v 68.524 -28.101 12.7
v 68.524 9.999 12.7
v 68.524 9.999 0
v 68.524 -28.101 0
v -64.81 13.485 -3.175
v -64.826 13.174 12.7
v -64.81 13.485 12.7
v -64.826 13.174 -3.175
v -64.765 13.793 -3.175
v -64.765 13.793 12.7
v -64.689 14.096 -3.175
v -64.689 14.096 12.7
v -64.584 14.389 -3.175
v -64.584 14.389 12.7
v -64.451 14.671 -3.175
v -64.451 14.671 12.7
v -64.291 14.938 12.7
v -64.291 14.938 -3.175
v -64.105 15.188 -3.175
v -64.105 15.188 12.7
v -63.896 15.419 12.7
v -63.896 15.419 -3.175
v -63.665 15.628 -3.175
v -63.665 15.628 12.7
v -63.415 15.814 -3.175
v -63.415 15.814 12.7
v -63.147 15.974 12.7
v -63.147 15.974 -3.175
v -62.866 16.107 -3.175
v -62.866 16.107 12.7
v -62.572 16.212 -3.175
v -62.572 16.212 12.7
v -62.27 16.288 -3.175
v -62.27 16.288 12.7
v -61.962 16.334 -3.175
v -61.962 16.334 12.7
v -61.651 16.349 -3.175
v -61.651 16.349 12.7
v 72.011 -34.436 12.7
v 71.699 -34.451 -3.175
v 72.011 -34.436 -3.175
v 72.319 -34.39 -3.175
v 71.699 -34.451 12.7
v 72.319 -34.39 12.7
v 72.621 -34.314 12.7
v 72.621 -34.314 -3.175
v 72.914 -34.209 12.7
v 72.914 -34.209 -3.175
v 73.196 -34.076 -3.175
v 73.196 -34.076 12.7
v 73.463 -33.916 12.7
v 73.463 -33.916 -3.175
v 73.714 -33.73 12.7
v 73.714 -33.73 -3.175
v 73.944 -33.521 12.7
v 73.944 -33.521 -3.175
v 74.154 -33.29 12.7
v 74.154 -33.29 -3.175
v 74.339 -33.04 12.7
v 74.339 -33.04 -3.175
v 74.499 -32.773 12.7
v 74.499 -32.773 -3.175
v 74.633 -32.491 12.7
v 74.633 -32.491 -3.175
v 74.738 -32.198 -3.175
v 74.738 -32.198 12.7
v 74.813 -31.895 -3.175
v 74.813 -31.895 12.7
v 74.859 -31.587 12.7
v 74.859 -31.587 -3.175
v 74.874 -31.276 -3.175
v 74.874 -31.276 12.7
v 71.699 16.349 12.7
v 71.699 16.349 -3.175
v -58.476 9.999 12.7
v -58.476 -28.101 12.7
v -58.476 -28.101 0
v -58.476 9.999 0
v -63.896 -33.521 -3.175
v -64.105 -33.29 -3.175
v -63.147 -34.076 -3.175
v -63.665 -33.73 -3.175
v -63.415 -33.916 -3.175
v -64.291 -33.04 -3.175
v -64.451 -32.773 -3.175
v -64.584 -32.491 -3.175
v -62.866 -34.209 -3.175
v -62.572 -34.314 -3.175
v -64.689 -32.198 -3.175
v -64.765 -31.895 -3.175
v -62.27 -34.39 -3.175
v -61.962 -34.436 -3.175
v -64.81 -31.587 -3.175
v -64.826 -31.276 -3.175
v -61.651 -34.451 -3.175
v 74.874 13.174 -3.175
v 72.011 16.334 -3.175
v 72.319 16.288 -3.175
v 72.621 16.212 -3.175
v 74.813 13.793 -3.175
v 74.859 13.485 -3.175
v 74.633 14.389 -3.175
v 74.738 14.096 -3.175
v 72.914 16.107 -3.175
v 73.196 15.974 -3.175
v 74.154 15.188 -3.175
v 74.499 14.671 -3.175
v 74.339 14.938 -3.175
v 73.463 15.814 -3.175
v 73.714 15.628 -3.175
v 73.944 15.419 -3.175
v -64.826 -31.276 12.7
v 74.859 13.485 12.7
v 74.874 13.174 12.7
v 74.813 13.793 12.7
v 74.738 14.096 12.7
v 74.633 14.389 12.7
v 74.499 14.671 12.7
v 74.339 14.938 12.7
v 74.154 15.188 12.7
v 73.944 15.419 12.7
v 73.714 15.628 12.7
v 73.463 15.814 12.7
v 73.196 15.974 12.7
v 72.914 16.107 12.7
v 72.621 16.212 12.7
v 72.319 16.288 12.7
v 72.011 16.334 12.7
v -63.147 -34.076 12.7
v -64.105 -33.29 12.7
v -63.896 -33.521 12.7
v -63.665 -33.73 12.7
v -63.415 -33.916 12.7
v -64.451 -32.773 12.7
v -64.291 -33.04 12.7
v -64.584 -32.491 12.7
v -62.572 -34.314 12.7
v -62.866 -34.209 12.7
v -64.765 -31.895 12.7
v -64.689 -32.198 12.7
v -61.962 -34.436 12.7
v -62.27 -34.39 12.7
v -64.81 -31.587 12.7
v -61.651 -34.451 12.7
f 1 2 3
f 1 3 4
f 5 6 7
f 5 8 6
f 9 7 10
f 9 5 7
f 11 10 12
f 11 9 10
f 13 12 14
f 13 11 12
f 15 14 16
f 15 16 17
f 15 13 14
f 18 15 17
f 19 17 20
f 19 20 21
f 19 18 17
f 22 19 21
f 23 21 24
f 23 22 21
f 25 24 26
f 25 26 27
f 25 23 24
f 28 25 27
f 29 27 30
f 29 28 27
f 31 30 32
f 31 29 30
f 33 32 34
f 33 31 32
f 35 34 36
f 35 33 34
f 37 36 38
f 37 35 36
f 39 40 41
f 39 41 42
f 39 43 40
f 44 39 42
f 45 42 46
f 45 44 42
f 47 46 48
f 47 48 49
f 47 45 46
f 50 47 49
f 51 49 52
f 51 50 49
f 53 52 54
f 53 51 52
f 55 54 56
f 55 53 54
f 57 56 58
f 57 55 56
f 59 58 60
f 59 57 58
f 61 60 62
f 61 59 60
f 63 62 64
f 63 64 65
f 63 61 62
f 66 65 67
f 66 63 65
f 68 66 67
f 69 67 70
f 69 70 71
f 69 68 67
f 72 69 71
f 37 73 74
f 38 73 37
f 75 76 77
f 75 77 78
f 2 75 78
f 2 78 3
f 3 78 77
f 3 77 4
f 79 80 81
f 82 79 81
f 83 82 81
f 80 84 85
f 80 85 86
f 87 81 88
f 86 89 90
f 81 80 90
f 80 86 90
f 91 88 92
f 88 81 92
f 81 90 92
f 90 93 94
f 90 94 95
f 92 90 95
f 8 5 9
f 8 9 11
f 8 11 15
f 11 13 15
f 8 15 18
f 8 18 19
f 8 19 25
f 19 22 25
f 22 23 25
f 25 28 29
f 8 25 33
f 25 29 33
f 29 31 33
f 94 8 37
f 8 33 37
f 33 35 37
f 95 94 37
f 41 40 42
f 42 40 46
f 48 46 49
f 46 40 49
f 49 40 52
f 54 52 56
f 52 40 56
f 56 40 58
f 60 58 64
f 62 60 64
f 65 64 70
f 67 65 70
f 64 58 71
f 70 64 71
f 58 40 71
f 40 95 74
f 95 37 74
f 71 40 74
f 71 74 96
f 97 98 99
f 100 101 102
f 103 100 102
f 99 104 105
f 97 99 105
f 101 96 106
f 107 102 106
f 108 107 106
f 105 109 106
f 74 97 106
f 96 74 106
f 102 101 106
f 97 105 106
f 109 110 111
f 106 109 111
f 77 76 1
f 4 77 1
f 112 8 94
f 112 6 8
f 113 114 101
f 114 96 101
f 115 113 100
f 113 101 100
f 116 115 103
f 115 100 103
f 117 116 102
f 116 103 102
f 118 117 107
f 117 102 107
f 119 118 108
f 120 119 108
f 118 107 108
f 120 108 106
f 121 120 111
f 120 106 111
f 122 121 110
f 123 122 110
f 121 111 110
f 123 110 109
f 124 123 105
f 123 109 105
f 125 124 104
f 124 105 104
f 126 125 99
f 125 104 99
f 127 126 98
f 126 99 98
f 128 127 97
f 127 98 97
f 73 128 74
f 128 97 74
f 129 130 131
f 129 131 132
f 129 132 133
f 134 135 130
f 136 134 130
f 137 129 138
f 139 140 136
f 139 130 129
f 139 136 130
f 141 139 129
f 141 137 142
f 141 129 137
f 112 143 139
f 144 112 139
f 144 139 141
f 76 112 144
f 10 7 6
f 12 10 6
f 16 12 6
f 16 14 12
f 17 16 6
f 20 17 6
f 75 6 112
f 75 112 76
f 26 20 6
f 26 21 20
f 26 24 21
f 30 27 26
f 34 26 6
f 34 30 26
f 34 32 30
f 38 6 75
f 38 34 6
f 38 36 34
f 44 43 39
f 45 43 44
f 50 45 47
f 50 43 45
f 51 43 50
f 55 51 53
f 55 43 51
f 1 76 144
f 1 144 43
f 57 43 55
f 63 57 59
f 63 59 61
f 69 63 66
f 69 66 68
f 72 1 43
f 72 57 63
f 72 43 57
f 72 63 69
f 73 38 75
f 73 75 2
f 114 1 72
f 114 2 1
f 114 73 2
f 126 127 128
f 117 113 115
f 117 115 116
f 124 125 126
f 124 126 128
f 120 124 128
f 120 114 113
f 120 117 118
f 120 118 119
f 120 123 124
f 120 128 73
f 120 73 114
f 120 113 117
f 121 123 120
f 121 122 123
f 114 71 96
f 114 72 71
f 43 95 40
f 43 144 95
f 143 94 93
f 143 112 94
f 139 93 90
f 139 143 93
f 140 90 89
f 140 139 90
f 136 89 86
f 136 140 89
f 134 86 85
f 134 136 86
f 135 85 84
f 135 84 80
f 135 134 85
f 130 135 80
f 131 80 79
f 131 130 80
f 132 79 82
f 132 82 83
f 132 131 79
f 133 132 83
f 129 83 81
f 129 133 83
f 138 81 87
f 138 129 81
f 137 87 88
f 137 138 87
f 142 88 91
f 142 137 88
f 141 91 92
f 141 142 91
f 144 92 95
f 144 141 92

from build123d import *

# Parameters (mm, degrees)
F0_W     = 6.35
F0_H     = 6.35
F0_H_2   = 38.1
F0_W_2   = 127
F1_DEPTH = 12.7
F2_DEPTH = 3.175
F3_DEPTH = 3.175
F4_R     = 3.175


with BuildPart() as f1:
    # F0 (on Top) → F1 (new body)
    with BuildSketch(Plane.XY):
        with Locations((71.6993232399, -31.2760059339)):
            Rectangle(F0_W, F0_H)
        with Locations((-61.6506767601, -9.0510059339)):
            Rectangle(F0_W, F0_H_2)
        with Locations((-61.6506767601, 13.1739940661)):
            Rectangle(F0_W, F0_H)
        with Locations((5.0243232399, 13.1739940661)):
            Rectangle(F0_W_2, F0_H)
        with Locations((71.6993232399, -9.0510059339)):
            Rectangle(F0_W, F0_H_2)
        with Locations((71.6993232399, 13.1739940661)):
            Rectangle(F0_W, F0_H)
        with Locations((5.0243232399, -31.2760059339)):
            Rectangle(F0_W_2, F0_H)
        with Locations((-61.6506767601, -31.2760059339)):
            Rectangle(F0_W, F0_H)
    extrude(amount=F1_DEPTH)

    # F2 (add): a face of the model
    f2_faces = [f1.faces().sort_by_distance(p)[0] for p in [
        (-63.3391798714, -9.0510059339, 0),
    ]]
    extrude(f2_faces, amount=F2_DEPTH)

    # F0 (on Top) → F3 (join)
    with BuildSketch(Plane.XY):
        Polygon((68.5243232399, 9.9989940661), (-58.4756767601, 9.9989940661), (68.5243232399, -28.1010059339), align=None)
        Polygon((68.5243232399, -28.1010059339), (-58.4756767601, 9.9989940661), (-58.4756767601, -28.1010059339), align=None)
    extrude(amount=-F3_DEPTH)

    # F4
    f4_edges = [f1.edges().sort_by_distance(p)[0] for p in [
        (-64.825677, -34.451006, 4.7625),
        (-64.825677, 16.348994, 4.7625),
        (74.874323, -34.451006, 4.7625),
        (74.874323, 16.348994, 4.7625),
    ]]
    fillet(f4_edges, radius=F4_R)


solid = f1.part
